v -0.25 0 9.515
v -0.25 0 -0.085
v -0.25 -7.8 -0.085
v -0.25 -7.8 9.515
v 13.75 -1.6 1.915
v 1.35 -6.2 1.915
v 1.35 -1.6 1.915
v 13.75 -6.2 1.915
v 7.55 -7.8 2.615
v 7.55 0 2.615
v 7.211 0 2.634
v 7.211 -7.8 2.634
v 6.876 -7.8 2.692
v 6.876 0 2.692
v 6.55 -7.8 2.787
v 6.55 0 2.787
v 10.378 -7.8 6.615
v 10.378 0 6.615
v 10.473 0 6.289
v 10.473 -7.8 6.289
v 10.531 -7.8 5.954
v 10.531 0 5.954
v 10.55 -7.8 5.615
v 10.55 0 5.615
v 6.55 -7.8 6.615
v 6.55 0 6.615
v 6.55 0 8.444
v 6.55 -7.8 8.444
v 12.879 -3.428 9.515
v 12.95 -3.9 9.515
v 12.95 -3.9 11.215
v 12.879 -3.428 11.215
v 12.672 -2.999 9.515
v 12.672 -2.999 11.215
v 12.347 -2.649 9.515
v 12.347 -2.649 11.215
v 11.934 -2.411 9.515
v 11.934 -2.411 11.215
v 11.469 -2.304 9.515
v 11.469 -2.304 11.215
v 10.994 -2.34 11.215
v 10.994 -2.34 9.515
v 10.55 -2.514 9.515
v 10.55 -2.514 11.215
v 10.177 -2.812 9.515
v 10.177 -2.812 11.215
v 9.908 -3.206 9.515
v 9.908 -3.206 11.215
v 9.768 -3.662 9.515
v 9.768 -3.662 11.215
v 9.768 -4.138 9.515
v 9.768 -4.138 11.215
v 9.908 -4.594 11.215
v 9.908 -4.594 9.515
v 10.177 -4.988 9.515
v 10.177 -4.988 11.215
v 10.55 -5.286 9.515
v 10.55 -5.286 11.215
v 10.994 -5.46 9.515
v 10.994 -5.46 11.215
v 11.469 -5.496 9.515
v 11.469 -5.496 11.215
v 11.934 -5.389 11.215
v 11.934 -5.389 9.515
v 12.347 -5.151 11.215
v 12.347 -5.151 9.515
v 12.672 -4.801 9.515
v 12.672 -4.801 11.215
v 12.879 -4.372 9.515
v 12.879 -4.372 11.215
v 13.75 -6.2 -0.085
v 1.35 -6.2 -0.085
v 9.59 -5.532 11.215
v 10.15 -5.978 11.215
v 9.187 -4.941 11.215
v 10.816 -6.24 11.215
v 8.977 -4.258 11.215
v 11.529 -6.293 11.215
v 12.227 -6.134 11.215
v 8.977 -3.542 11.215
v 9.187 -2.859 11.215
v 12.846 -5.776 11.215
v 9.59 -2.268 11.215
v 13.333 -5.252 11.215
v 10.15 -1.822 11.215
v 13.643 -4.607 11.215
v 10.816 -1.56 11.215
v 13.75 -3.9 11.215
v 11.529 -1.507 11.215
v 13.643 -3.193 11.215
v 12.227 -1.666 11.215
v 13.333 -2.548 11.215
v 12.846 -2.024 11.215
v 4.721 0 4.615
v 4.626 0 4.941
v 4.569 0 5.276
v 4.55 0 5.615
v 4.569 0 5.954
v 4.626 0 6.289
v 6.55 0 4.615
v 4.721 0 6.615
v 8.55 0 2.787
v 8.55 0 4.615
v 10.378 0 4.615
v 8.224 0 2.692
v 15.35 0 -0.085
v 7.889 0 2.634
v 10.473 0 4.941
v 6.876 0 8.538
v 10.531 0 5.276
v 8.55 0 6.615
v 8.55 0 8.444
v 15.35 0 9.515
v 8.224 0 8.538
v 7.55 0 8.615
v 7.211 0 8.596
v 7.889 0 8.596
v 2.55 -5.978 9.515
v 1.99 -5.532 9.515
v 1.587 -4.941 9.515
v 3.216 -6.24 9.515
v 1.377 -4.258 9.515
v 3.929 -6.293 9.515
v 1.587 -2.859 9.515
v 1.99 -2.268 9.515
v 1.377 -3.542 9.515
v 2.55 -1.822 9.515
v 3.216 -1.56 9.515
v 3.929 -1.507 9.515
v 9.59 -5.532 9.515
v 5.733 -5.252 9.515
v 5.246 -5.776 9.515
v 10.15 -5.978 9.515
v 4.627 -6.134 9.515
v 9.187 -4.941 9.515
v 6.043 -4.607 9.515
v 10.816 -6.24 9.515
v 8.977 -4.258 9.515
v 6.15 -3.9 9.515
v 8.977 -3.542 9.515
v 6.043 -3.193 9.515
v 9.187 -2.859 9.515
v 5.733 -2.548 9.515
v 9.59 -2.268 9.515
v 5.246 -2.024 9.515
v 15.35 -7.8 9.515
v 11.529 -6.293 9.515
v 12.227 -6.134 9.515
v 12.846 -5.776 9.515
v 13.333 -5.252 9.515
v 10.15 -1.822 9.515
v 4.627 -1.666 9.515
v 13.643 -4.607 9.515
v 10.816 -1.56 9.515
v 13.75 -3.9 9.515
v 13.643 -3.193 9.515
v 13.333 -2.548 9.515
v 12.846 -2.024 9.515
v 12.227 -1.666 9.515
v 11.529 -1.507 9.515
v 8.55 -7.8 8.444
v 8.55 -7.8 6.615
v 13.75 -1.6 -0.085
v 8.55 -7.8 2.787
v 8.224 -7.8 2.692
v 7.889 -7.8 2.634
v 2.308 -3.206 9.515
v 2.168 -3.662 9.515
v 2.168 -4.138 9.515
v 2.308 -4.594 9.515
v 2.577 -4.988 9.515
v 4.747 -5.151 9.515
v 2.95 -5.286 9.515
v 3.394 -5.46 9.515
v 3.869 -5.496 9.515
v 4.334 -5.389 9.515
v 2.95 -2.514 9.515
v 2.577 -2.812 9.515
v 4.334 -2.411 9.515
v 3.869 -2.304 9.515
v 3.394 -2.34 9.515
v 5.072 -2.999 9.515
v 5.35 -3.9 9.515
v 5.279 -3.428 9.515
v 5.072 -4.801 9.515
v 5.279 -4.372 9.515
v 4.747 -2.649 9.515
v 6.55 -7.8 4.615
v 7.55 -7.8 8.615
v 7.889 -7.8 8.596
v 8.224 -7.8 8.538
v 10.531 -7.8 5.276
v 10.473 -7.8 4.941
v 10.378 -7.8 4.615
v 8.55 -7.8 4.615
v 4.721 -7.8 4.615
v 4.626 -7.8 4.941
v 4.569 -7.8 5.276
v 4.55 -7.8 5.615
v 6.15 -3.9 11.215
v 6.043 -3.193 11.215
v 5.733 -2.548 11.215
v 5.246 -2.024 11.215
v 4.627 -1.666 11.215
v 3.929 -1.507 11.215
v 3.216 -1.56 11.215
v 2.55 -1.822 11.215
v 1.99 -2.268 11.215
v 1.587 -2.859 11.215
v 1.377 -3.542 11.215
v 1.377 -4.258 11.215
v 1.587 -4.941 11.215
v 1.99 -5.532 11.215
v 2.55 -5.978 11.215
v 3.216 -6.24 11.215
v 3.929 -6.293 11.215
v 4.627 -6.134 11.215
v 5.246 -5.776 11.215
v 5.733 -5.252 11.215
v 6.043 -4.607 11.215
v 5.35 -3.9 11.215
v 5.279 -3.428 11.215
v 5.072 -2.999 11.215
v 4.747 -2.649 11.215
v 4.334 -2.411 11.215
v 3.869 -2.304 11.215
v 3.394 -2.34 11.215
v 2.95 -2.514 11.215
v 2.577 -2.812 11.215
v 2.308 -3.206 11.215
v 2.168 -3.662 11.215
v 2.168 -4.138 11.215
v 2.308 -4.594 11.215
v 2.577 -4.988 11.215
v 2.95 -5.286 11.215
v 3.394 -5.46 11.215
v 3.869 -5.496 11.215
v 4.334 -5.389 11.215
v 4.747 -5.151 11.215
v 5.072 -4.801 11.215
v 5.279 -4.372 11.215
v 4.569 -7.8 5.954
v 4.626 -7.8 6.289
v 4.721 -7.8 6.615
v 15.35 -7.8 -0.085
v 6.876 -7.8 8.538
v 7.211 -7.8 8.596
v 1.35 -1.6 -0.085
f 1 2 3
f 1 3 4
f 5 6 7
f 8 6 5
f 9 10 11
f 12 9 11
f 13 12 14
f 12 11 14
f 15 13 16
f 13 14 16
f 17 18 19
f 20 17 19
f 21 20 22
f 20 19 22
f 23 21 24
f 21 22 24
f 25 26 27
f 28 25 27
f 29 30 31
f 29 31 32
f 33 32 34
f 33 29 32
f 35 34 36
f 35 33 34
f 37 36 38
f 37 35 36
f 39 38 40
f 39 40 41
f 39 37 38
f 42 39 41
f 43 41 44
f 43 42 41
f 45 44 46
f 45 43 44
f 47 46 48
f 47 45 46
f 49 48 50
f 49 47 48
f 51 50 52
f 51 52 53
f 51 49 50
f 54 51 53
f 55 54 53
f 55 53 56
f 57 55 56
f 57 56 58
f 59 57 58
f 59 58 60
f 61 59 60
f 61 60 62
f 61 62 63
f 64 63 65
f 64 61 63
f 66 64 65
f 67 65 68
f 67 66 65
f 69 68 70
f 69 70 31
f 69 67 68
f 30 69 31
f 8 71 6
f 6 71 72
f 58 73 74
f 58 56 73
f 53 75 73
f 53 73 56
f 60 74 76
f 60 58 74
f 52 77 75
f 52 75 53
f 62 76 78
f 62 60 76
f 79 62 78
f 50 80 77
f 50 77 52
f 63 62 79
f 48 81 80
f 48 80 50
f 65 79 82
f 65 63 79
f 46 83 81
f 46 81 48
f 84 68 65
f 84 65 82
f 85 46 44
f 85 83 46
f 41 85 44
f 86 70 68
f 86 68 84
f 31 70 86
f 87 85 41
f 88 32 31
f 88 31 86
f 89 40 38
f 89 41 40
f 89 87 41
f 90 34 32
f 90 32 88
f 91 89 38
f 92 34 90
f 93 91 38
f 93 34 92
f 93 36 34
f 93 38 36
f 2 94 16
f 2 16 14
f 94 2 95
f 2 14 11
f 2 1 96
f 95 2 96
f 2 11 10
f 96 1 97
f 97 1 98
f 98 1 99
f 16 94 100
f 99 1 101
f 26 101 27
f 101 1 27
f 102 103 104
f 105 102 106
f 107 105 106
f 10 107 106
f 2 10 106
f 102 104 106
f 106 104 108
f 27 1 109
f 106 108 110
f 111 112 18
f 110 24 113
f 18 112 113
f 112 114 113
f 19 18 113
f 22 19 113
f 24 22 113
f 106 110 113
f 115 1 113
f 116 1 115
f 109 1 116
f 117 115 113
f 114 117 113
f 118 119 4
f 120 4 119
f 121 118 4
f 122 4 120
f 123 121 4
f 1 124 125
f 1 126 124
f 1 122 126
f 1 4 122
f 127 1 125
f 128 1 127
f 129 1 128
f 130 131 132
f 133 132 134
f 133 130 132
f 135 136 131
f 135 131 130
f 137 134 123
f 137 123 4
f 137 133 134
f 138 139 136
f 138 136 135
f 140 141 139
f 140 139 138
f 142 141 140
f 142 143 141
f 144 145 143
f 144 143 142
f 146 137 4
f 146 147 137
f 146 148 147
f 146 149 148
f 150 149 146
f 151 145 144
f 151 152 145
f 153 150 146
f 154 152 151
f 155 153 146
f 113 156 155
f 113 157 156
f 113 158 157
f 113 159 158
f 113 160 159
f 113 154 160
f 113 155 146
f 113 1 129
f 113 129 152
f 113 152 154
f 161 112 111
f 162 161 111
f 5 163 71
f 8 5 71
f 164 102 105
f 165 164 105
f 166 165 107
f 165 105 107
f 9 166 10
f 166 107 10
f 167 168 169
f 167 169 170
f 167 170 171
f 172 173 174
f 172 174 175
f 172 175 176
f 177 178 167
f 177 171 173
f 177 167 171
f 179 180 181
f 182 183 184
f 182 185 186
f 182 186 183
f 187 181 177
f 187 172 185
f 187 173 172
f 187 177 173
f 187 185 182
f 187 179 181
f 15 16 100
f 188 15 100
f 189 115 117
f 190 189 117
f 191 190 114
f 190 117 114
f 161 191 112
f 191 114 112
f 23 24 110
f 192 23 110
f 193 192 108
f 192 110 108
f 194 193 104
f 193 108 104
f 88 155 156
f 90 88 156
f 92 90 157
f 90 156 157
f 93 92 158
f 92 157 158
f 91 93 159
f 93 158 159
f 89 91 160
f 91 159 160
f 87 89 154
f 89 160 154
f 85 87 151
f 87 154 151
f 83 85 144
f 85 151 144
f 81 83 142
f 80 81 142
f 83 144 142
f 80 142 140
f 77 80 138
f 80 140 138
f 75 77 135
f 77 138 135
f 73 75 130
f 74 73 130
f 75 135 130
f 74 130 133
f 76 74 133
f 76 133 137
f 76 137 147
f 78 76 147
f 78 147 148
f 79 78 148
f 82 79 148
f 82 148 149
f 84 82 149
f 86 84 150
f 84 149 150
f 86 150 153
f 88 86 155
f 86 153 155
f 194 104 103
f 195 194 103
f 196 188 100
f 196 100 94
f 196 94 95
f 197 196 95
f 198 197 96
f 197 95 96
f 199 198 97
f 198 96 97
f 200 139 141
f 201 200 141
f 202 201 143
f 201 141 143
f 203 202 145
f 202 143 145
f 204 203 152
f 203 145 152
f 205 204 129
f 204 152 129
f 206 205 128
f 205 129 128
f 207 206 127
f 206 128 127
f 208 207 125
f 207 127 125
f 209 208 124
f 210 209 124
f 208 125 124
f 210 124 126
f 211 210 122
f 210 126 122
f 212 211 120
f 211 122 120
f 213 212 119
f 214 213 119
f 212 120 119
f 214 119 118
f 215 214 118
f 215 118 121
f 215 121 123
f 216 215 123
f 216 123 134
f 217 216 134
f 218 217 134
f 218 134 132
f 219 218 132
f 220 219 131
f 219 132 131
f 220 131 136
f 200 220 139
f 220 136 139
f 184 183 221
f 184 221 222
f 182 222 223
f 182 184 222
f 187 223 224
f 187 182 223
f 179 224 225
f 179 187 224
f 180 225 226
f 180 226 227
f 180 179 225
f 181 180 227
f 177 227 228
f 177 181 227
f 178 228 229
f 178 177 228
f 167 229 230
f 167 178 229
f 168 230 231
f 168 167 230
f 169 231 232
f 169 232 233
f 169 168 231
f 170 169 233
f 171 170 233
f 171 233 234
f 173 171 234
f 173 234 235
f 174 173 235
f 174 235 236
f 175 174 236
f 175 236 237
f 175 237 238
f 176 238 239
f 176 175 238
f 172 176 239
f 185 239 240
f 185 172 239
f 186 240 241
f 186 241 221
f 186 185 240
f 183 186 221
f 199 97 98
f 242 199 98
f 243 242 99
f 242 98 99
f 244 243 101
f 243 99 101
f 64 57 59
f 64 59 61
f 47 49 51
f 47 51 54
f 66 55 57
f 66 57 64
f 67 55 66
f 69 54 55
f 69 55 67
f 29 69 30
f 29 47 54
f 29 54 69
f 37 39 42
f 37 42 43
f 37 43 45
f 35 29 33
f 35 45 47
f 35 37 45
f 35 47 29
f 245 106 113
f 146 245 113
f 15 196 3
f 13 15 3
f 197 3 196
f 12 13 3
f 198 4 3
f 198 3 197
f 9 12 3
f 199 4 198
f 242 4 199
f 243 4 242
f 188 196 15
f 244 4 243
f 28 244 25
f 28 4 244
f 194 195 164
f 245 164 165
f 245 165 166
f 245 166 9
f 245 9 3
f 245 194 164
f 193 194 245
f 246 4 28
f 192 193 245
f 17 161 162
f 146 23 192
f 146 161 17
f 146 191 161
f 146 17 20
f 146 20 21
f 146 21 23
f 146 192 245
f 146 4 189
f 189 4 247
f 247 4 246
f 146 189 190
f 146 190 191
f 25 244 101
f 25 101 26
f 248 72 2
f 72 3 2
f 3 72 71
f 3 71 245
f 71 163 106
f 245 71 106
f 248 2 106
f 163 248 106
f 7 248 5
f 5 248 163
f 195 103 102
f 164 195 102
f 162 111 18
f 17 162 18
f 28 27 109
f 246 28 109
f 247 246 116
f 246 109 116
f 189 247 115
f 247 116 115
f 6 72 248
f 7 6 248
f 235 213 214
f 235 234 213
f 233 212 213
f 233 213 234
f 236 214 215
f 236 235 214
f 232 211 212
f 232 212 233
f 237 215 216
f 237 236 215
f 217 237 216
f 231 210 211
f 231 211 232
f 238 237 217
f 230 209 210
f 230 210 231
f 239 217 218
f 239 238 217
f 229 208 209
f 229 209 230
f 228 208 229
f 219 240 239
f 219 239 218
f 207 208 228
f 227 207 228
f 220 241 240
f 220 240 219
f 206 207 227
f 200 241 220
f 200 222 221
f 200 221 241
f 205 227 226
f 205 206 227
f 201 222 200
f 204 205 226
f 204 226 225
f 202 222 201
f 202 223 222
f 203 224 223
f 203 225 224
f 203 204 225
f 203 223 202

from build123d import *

# Parameters (mm, degrees)
F0_W     = 15.6
F0_H     = 9.6
F1_DEPTH = 7.8
F2_R     = 2.4
F2_R_2   = 1.6
F3_DEPTH = 1.7
F5_DEPTH = 2


# Not quite as in the source:
# - a feature names something its author has since deleted; it is built from what else it names


with BuildPart() as f1:
    # F0 (on Front) → F1 (new body)
    with BuildSketch(Plane.XZ):
        with Locations((7.5497636572, 4.7150965011)):
            Rectangle(F0_W, F0_H)
        with BuildLine():
            Line((10.5497636572, 6.6150965011), (10.5497636572, 5.6150965011))
            Line((10.5497636572, 5.6150965011), (10.5497636572, 4.6150965011))
            Line((10.5497636572, 4.6150965011), (10.3781907819, 4.6150965011))
            ThreePointArc((10.3781907819, 4.6150965011), (9.6710840007, 3.4937761575), (8.5497636572, 2.7866693764))
            Line((8.5497636572, 2.7866693764), (8.5497636572, 2.6150965011))
            Line((8.5497636572, 2.6150965011), (7.5497636572, 2.6150965011))
            Line((7.5497636572, 2.6150965011), (6.5497636572, 2.6150965011))
            Line((6.5497636572, 2.6150965011), (6.5497636572, 2.7866693764))
            ThreePointArc((6.5497636572, 2.7866693764), (5.4284433136, 3.4937761575), (4.7213365324, 4.6150965011))
            Line((4.7213365324, 4.6150965011), (4.5497636572, 4.6150965011))
            Line((4.5497636572, 4.6150965011), (4.5497636572, 5.6150965067))
            Line((4.5497636572, 5.6150965067), (4.5497636572, 6.6150965011))
            Line((4.5497636572, 6.6150965011), (4.7213365324, 6.6150965011))
            ThreePointArc((4.7213365324, 6.6150965011), (5.4284433136, 7.7364168447), (6.5497636572, 8.4435236258))
            Line((6.5497636572, 8.4435236258), (6.5497636572, 8.6150965011))
            Line((6.5497636572, 8.6150965011), (7.5497636572, 8.6150965011))
            Line((7.5497636572, 8.6150965011), (8.5497636572, 8.6150965011))
            Line((8.5497636572, 8.6150965011), (8.5497636572, 8.4435236258))
            ThreePointArc((8.5497636572, 8.4435236258), (9.6710840007, 7.7364168447), (10.3781907819, 6.6150965011))
            Line((10.3781907819, 6.6150965011), (10.5497636572, 6.6150965011))
        make_face(mode=Mode.SUBTRACT)
        with BuildLine():
            ThreePointArc((8.5497636572, 2.7866693764), (9.6710840007, 3.4937761575), (10.3781907819, 4.6150965011))
            Line((10.3781907819, 4.6150965011), (8.5497636572, 4.6150965011))
            Line((8.5497636572, 4.6150965011), (8.5497636572, 2.7866693764))
        make_face()
        with BuildLine():
            Line((8.5497636572, 6.6150965011), (10.3781907819, 6.6150965011))
            ThreePointArc((10.3781907819, 6.6150965011), (9.6710840007, 7.7364168447), (8.5497636572, 8.4435236258))
            Line((8.5497636572, 8.4435236258), (8.5497636572, 6.6150965011))
        make_face()
        with BuildLine():
            Line((4.7213365324, 6.6150965011), (6.5497636572, 6.6150965011))
            Line((6.5497636572, 6.6150965011), (6.5497636572, 8.4435236258))
            ThreePointArc((6.5497636572, 8.4435236258), (5.4284433136, 7.7364168447), (4.7213365324, 6.6150965011))
        make_face()
        with BuildLine():
            Line((6.5497636572, 2.7866693764), (6.5497636572, 4.6150965011))
            Line((6.5497636572, 4.6150965011), (4.7213365324, 4.6150965011))
            ThreePointArc((4.7213365324, 4.6150965011), (5.4284433136, 3.4937761575), (6.5497636572, 2.7866693764))
        make_face()
        with BuildLine():
            Line((10.5497636572, 4.6150965011), (10.5497636572, 5.6150965011))
            ThreePointArc((10.5497636572, 5.6150965011), (10.5065593361, 5.1077905649), (10.3781907819, 4.6150965011))
            Line((10.3781907819, 4.6150965011), (10.5497636572, 4.6150965011))
        make_face()
        with BuildLine():
            ThreePointArc((10.3781907819, 6.6150965011), (10.5065593361, 6.1224024373), (10.5497636572, 5.6150965011))
            Line((10.5497636572, 5.6150965011), (10.5497636572, 6.6150965011))
            Line((10.5497636572, 6.6150965011), (10.3781907819, 6.6150965011))
        make_face()
        with BuildLine():
            ThreePointArc((7.5497636572, 8.6150965011), (8.0570695933, 8.5718921801), (8.5497636572, 8.4435236258))
            Line((8.5497636572, 8.4435236258), (8.5497636572, 8.6150965011))
            Line((8.5497636572, 8.6150965011), (7.5497636572, 8.6150965011))
        make_face()
        with BuildLine():
            ThreePointArc((6.5497636572, 8.4435236258), (7.042457721, 8.5718921801), (7.5497636572, 8.6150965011))
            Line((7.5497636572, 8.6150965011), (6.5497636572, 8.6150965011))
            Line((6.5497636572, 8.6150965011), (6.5497636572, 8.4435236258))
        make_face()
        with BuildLine():
            ThreePointArc((4.5497636572, 5.6150965067), (4.5929679787, 6.12240244), (4.7213365324, 6.6150965011))
            Line((4.7213365324, 6.6150965011), (4.5497636572, 6.6150965011))
            Line((4.5497636572, 6.6150965011), (4.5497636572, 5.6150965067))
        make_face()
        with BuildLine():
            Line((4.5497636572, 4.6150965011), (4.7213365324, 4.6150965011))
            ThreePointArc((4.7213365324, 4.6150965011), (4.5929679777, 5.1077905677), (4.5497636572, 5.6150965067))
            Line((4.5497636572, 5.6150965067), (4.5497636572, 4.6150965011))
        make_face()
        with BuildLine():
            Line((6.5497636572, 2.6150965011), (7.5497636572, 2.6150965011))
            ThreePointArc((7.5497636572, 2.6150965011), (7.042457721, 2.6583008221), (6.5497636572, 2.7866693764))
            Line((6.5497636572, 2.7866693764), (6.5497636572, 2.6150965011))
        make_face()
        with BuildLine():
            Line((8.5497636572, 2.6150965011), (8.5497636572, 2.7866693764))
            ThreePointArc((8.5497636572, 2.7866693764), (8.0570695933, 2.6583008221), (7.5497636572, 2.6150965011))
            Line((7.5497636572, 2.6150965011), (8.5497636572, 2.6150965011))
        make_face()
    extrude(amount=F1_DEPTH)

    # F2 (on face) → F3 (join)
    with BuildSketch(Plane.XY.offset(9.5150965011)):
        with Locations((3.7497636572, -3.9)):
            Circle(F2_R)
        with Locations((3.7497636572, -3.9)):
            Circle(F2_R_2, mode=Mode.SUBTRACT)
        with Locations((11.3497636572, -3.9)):
            Circle(F2_R)
        with Locations((11.3497636572, -3.9)):
            Circle(F2_R_2, mode=Mode.SUBTRACT)
    extrude(amount=F3_DEPTH)

    # F4 (on face) → F5 (cut)
    with BuildSketch(Plane(origin=(0, 0, -0.0849034989), x_dir=(1, 0, 0), z_dir=(0, 0, -1))):
        Polygon((1.3497636572, 6.2), (1.3497636572, 3.9), (1.3497636572, 1.6), (7.5497636572, 1.6), (13.7497636572, 1.6), (13.7497636572, 3.9), (13.7497636572, 6.2), (7.5497636572, 6.2), align=None)
    extrude(amount=-F5_DEPTH, mode=Mode.SUBTRACT)


solid = f1.part
